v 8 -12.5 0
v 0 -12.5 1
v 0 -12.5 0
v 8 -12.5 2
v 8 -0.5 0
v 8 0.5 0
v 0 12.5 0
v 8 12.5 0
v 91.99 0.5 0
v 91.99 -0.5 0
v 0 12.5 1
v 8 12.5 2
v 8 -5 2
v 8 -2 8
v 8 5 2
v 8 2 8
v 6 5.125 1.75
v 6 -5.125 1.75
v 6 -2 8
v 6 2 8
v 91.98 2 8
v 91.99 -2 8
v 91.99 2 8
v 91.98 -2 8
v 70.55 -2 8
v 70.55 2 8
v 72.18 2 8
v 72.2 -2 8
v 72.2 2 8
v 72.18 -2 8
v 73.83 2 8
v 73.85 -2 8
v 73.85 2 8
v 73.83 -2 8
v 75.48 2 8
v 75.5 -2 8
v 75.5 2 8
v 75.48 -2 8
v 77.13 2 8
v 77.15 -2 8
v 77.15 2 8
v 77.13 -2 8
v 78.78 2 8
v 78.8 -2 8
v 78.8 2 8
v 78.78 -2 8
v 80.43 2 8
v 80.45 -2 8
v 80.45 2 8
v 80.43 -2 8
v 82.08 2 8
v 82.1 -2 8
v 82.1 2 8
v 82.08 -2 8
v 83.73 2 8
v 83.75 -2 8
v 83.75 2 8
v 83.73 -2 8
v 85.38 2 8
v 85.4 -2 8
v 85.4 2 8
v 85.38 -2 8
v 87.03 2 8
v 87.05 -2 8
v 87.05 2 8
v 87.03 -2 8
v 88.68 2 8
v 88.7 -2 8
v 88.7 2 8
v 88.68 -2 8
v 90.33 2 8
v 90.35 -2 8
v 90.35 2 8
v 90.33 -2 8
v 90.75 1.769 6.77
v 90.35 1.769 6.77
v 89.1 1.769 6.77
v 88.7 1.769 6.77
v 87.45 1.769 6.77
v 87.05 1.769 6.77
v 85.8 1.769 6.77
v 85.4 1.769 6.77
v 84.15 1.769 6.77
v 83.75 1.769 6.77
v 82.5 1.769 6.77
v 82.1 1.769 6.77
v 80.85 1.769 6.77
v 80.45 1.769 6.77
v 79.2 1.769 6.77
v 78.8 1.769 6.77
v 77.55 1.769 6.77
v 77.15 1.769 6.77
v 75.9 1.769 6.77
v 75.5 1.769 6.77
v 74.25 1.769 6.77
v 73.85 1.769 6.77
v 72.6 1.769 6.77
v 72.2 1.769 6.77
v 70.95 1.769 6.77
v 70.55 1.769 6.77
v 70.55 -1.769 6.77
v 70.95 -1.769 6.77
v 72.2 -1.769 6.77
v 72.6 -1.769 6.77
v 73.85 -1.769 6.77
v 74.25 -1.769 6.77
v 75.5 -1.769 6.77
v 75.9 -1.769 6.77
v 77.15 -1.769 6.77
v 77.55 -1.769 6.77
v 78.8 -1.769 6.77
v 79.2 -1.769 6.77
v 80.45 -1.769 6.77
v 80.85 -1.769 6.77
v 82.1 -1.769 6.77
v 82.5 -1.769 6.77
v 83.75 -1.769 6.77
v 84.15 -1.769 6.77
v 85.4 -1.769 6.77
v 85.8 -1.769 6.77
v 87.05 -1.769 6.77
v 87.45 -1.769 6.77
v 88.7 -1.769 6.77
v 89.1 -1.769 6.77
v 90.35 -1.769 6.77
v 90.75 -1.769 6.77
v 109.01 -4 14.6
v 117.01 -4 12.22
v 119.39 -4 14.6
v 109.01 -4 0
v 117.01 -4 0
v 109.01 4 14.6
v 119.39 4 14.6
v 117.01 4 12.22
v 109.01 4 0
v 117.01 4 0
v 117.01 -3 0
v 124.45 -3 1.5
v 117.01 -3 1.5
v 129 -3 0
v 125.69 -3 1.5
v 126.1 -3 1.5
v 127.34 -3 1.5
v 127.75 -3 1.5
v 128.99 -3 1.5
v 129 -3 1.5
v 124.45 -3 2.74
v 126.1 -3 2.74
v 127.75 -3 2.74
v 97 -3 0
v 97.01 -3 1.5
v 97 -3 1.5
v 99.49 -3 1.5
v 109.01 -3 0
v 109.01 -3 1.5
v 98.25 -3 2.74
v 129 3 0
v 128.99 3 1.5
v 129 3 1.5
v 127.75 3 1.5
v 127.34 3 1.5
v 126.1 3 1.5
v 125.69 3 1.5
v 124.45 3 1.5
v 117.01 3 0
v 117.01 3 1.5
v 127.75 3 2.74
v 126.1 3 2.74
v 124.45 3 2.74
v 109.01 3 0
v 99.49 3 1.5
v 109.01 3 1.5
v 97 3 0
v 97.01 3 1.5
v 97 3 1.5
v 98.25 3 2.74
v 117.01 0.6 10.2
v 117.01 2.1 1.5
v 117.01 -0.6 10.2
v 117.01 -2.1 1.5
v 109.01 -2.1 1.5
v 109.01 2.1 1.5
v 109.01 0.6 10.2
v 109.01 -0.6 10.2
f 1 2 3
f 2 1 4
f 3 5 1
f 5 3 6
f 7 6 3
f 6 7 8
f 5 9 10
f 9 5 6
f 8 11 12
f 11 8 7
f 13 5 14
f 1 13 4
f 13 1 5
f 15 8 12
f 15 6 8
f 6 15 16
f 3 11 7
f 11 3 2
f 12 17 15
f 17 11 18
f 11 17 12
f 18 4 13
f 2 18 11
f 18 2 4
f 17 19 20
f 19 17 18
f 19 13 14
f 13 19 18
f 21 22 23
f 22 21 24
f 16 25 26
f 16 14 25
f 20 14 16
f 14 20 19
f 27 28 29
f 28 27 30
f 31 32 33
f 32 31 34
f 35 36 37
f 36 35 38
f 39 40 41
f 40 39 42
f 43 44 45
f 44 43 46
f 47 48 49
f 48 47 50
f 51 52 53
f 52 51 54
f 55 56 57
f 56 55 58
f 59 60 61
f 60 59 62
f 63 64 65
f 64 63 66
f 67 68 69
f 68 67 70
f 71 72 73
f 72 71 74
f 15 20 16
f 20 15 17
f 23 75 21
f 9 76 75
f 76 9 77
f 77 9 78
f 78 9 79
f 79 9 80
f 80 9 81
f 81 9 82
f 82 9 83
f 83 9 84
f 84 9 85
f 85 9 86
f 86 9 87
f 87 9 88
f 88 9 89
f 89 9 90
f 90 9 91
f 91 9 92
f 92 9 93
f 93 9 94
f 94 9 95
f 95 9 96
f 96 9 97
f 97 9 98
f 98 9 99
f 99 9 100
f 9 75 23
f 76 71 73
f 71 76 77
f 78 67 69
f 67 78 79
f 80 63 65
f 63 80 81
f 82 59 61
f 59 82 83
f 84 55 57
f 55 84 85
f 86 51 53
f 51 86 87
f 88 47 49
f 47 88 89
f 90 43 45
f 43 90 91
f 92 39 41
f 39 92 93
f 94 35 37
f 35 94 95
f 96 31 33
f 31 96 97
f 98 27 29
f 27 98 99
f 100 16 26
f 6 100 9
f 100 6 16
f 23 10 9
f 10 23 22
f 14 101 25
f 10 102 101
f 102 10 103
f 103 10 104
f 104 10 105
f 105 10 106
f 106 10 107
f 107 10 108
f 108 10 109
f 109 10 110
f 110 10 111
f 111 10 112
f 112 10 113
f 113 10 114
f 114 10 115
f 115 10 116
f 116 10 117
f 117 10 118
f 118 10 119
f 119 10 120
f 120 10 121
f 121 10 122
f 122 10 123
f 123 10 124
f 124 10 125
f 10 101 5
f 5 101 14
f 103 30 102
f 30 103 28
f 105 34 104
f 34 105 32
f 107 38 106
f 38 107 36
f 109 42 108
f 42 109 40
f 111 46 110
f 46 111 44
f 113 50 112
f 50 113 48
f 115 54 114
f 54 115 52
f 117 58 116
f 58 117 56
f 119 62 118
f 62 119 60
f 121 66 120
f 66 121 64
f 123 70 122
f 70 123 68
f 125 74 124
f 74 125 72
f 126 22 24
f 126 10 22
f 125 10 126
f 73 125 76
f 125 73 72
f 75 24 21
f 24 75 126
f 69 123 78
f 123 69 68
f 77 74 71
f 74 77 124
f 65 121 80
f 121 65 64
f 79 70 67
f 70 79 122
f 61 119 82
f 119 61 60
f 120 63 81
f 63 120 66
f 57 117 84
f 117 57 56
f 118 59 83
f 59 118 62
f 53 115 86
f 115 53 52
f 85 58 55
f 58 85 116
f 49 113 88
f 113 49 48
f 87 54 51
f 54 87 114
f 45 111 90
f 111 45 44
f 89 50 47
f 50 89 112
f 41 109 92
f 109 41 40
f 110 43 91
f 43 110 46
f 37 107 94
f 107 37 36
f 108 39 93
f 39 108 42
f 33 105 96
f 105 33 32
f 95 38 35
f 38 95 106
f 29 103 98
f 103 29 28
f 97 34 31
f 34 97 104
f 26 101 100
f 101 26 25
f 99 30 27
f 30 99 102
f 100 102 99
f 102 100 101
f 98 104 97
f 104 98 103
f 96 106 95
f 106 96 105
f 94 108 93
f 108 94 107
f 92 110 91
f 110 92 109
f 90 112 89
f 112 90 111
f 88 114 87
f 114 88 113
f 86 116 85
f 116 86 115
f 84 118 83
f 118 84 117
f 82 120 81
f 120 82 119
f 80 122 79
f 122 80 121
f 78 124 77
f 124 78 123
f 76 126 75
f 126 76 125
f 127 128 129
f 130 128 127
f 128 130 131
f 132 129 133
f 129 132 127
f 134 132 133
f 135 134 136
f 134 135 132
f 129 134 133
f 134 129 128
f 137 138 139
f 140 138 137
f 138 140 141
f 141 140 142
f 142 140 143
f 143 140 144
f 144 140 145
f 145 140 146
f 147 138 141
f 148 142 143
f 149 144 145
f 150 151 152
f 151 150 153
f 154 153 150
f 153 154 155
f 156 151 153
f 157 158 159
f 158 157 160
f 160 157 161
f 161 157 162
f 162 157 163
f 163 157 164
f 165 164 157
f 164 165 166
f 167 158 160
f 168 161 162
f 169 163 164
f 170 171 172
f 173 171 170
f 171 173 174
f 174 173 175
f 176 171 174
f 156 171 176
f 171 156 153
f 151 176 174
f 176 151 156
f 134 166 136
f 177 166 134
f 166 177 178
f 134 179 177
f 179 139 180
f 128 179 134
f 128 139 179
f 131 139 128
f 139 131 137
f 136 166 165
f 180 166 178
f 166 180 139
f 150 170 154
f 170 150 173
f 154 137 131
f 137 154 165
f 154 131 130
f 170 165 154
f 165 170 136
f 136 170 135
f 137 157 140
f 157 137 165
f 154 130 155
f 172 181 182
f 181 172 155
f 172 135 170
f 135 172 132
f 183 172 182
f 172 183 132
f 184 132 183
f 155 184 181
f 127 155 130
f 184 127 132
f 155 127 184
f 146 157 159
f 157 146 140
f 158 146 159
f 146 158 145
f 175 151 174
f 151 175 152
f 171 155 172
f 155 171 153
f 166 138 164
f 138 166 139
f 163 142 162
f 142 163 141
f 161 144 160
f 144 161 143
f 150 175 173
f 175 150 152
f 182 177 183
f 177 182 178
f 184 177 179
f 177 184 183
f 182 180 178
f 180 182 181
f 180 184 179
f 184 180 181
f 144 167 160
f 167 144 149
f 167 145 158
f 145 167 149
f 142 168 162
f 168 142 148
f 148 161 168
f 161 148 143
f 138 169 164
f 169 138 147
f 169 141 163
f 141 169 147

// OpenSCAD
// HedgehogClip_2.scad
//
// Gutter clip for retaining a "hedgehog" debris-repelling filler.
// Inspired by a wire-based design by David Poston.
//
// Take 2 with narrower, triangular cross piece and adjustable retaining teeth
//

delta           = 0.01 ;
clearance       = 0.10 ;

gulley_w        = 80 ;
gulley_edge_w   = 12 ;   
clip_tw         = 4 ;                   // Width of cross-piece triangle
clip_ta         = 1.0 ;                 // Width of triangle apex (non-zero for printing)
clip_th         = 8 ;                   // Height of cross-piece triangle
clip_thx        = 8.5 ;                 // Height of triangle hole in retainer
clip_l          = gulley_w + gulley_edge_w ;
clip_tbar_w     = 25 ;                  // Width of T-bar end
clip_tbar_d     = gulley_edge_w/2+2 ;   // Depth of T-bar end
clip_tbar_t0    = 1 ;                   // Thickness of T-bar thin end
clip_tbar_t     = 2 ;                   // Thickness of T-bar thick end
retainer_w      = 8 ;                   // Width of retainer
retainer_d      = 8 ;                  // Depth of retainer
retainer_t      = 1.5 ;                 // Thickness of retainer cross-bar
retainer_lip    = 2.4 ;                 // Width/thickness of retainer lip
retainer_gap    = 2.0 ;                 // Height between retaining lip and cross-piece
retainer_catch  = retainer_lip/2 ;      // Size of retainer end catch 
retainer_tooth  = 1.25 ;                // Size of retainer teeth
retainer_pitch  = 1.65 ; // Pitch of retainer teeth

// Supporting shape definitions

module triangular_prism(l, w, h) {
    // Triangular prism, centred on and extending along X-axis,
    // with the apex down
    //
    // l = length of prism
    // w = width of base of prism
    // h = height from base to apex of prism
    //
    // NOTE: this can be constructed as a degenerate form of "symmetric_trapezoid"
    //
    rotate([0,90,0]) {
        linear_extrude(height=l) {
            polygon(
                points=[
                    [0,0], 
                    [-h, -w/2], 
                    [-h, +w/2], 
                    ],
                paths=[[0,1,2,0]]
            ) ;
        }
    }
}
////-Test triangular_prism(l, w, h)
// triangular_prism(50, 3, 8) ;


module symmetric_trapezoid(l, w1, w2, h) {
    // Symmetric tapered cuboid lying on X-Y plane, extending from origin along X-axis
    //
    // l    = overall length (X-dimension)
    // w1   = width of edge lying on X-Y plane
    // w2   = width of edge above X-Y plane
    // h    = height (Z-dimension)
    //
    rotate([0,90,0]) {
        linear_extrude(height=l) {
            polygon(
                points=[
                    [ 0,-w1/2], 
                    [-h,-w2/2], 
                    [-h,+w2/2], 
                    [0, +w1/2],
                    ],
                paths=[[0,1,2,3,0]]
            ) ;
        }
    }
}
////-Test symmetric_trapezoid(l, w1, w2, t)
// symmetric_trapezoid(50, 2, 4, 8) ;


module wedge(l,w,t0,t1) {
    // Wedge with edge lying on and extending on the X-axis, 
    // tapering along the Y axis.
    //
    // l  = length of wedge
    // w  = width of wedge
    // t0 = thickness of wedge at X-axis (y=0)
    // t1 = thickness of wedge away from X-axis (y=w)
    //
    difference() {
        // Body:
        translate([0,0,0])
            cube(size=[l,w,t0+t1], center=false) ;
        // Taper:
        translate([0,0,t0])
            rotate([atan2(t1-t0,w),0,0])
                translate([-delta,-delta,0])
                    cube(size=[l+delta*2,w+t0+t1,t0+t1], center=false) ;
    }
}
////-Test wedge(l,w,t0,t1)
// wedge(100,10,2,1) ;
// wedge(20,2,2,0) ;


module sawtooth_rack(l, w, t, th, tw, tp) {
    // Sawtooth rack centred on +ve X-axis.
    // Teeth are on upper side, with vertical edge facing towards -X, and 45-degree slope facing +X.
    // Bottom of teeth are on X-Y plane.
    //
    // Note: 
    //  tp > tw spaces teeth apart, allowing room for the teeth to drop in the gaps
    //  tw > th gives flattened tops, suitable for subtraction to create spaced-out teeth
    //
    // l = overall length of rack
    // w = width of rack
    // t = thickness of rack, not including teeth
    // th = height of teeth
    // tw = width of teeth
    // tp = pitch of teeth
    //
    nt = floor(l/tp) ;   // Number of teeth
    translate([0,-w/2,-t])
        cube(size=[l,w,t]) ;
    intersection() {
        for (n = [0:nt-1]) {
            translate([l-tw-n*tp,w/2,-delta])
               rotate([0,0,-90])
                   wedge(w, tw, tw, 0) ;
        }
        translate([-delta,-w/2,-delta])
            cube(size=[l,w,th]) ;                       
    }
}
////-Test sawtooth_rack(l, w, t, th, tp)
//sawtooth_rack(15, 5, 1, 1, 1, 1.5) ;
//sawtooth_rack(15, 5, 1, 1, 1.5, 1.5) ;


// Hedgehog clip definition

module clip_main_part(tbar_w, tbar_d, tbar_t, tbar_t0, clip_l, clip_w, clip_a, clip_h) {
    rotate([0,0,-90])
        translate([-tbar_w/2,0,0])
            wedge(tbar_w, tbar_d, tbar_t0, tbar_t) ;
    translate([tbar_d-tbar_t,0,0])
        symmetric_trapezoid(tbar_t, clip_w*3, clip_w, clip_h) ;
    translate([tbar_d-delta,0,0])
        symmetric_trapezoid(clip_l-tbar_d, clip_a, clip_w, clip_h) ;
}
////-Test clip_main_part(tbar_w,tbar_d,tbar_t0,clip_l,clip_w,clip_t)
//clip_main_part(clip_tbar_w, clip_tbar_d, clip_tbar_t, clip_tbar_t0, clip_l, clip_tw, clip_ta, clip_th) ;


module clip_main_toothed(tbar_w, tbar_d, tbar_t, tbar_t0, clip_l, clip_w, clip_a, clip_h, tooth_h, tooth_p) {
    difference() {
        clip_main_part(tbar_w, tbar_d, tbar_t, tbar_t0, clip_l, clip_w, clip_a, clip_h) ;
        translate([clip_l*0.75,0,clip_h+delta])
            mirror([0,0,1])
                sawtooth_rack(clip_l*0.25, clip_w+2*delta, 1, tooth_h, tooth_p, tooth_p) ;

    }
}
////-test clip_main_toothed(tbar_w, tbar_d, tbar_t, tbar_t0, clip_l, clip_w, clip_a, clip_h, tooth_p)
clip_main_toothed(clip_tbar_w, clip_tbar_d, clip_tbar_t, clip_tbar_t0, clip_l, clip_tw, clip_ta, clip_th, retainer_tooth, retainer_pitch) ;


module clip_retainer(body_d, body_w, body_h, body_tw, body_th, body_ta, arm_l, arm_w, arm_t, lip, gap, catch, lug) {
    difference() {
        union() {
            // Retaining clip slider body
            translate([-body_d+delta,-body_w/2,0])
                cube(size=[body_d, body_w, body_h], center=false) ;
            // Retaining clip gulley edge hook
            translate([-delta,body_w/2,0])
                rotate([0,0,-90])
                    wedge(body_w, lip, lip, 0) ;
            // Retaining clip positioning arm
            translate([-arm_l-body_d,-arm_w/2,body_h-arm_t])
                cube(size=[arm_l*2+body_d, arm_w, arm_t], center=false) ;
            // Lug to push down on main part, hence engage positioning catch
            translate([lug-arm_l-body_d,arm_w/2,body_h-arm_t+delta]) {
                rotate([-90,0,-90])
                    wedge(arm_w, lug, lug, 0) ;
                rotate([-180,0,-90])
                    wedge(arm_w, lug, lug, 0) ;
            }



            // Retaining clip positioning catch
            translate([arm_l-catch,arm_w/2,body_h-arm_t+delta])
                rotate([-90,0,-90])
                    wedge(arm_w, catch, catch, 0) ;
        }
        translate([-body_d-delta,0,lip+gap])
            rotate([0,0,0])
                symmetric_trapezoid(
                    body_d+lip+delta*2, 
                    body_ta+clearance*2, 
                    body_tw+clearance*2, 
                    body_th+clearance*2
                    ) ;
    }
}

////-Test clip_retainer(body_d, body_w, body_h, body_tw, body_th, body_ta, arm_l, arm_w, arm_t, lip, gap, catch)
retainer_slider_h = clip_thx+retainer_t+retainer_lip+retainer_gap+clearance*2 ;
module clip_retainer_part() {
    clip_retainer(
        retainer_d, retainer_w, retainer_slider_h,
        clip_tw, clip_thx, clip_ta,
        gulley_edge_w+retainer_tooth, clip_tw+2, retainer_t, 
        retainer_lip, retainer_gap, retainer_catch, retainer_catch
    ) ;    
}

// For assembly viewing:
//translate([clip_l+clip_tbar_d+gulley_edge_w+5,0,-retainer_lip-retainer_gap]) clip_retainer_part() ;

// For printing with common baseline and no overhang
//translate([clip_l+clip_tbar_d+gulley_edge_w+5,0,retainer_slider_h]) mirror([0,0,1]) clip_retainer_part() ;


module clip_retainer_toothed(body_d, body_w, body_h, body_tw, body_th, body_ta, arm_l, arm_w, arm_t, lip, gap, tooth_h, tooth_p) {
    rack_l = tooth_p*3+delta ;
    clip_retainer(body_d, body_w, body_h, body_tw, body_th, body_ta, arm_l, arm_w, arm_t, lip, gap, 0, tooth_h) ;
    translate([arm_l-rack_l,0,body_h-arm_t])
        mirror([0,0,1])
            sawtooth_rack(rack_l, arm_w, 1, tooth_h, tooth_h, tooth_p) ;
}
////-Test clip_retainer_toothed(body_d, body_w, body_h, body_tw, body_th, body_ta, arm_l, arm_w, arm_t, lip, gap, tooth_p)
module clip_retainer_toothed_part() {
    clip_retainer_toothed(
        retainer_d, retainer_w, retainer_slider_h,
        clip_tw, clip_thx, clip_ta,
        gulley_edge_w, clip_tw+2, retainer_t, 
        retainer_lip, retainer_gap, retainer_tooth, retainer_pitch
    ) ;    
}

// For assembly viewing:
//translate([clip_l+clip_tbar_d+gulley_edge_w+5,0,-retainer_lip-retainer_gap]) clip_retainer_toothed_part() ;

// For printing with common baseline and no overhang
translate([clip_l+clip_tbar_d+gulley_edge_w+5,0,retainer_slider_h]) mirror([0,0,1]) clip_retainer_toothed_part() ;
